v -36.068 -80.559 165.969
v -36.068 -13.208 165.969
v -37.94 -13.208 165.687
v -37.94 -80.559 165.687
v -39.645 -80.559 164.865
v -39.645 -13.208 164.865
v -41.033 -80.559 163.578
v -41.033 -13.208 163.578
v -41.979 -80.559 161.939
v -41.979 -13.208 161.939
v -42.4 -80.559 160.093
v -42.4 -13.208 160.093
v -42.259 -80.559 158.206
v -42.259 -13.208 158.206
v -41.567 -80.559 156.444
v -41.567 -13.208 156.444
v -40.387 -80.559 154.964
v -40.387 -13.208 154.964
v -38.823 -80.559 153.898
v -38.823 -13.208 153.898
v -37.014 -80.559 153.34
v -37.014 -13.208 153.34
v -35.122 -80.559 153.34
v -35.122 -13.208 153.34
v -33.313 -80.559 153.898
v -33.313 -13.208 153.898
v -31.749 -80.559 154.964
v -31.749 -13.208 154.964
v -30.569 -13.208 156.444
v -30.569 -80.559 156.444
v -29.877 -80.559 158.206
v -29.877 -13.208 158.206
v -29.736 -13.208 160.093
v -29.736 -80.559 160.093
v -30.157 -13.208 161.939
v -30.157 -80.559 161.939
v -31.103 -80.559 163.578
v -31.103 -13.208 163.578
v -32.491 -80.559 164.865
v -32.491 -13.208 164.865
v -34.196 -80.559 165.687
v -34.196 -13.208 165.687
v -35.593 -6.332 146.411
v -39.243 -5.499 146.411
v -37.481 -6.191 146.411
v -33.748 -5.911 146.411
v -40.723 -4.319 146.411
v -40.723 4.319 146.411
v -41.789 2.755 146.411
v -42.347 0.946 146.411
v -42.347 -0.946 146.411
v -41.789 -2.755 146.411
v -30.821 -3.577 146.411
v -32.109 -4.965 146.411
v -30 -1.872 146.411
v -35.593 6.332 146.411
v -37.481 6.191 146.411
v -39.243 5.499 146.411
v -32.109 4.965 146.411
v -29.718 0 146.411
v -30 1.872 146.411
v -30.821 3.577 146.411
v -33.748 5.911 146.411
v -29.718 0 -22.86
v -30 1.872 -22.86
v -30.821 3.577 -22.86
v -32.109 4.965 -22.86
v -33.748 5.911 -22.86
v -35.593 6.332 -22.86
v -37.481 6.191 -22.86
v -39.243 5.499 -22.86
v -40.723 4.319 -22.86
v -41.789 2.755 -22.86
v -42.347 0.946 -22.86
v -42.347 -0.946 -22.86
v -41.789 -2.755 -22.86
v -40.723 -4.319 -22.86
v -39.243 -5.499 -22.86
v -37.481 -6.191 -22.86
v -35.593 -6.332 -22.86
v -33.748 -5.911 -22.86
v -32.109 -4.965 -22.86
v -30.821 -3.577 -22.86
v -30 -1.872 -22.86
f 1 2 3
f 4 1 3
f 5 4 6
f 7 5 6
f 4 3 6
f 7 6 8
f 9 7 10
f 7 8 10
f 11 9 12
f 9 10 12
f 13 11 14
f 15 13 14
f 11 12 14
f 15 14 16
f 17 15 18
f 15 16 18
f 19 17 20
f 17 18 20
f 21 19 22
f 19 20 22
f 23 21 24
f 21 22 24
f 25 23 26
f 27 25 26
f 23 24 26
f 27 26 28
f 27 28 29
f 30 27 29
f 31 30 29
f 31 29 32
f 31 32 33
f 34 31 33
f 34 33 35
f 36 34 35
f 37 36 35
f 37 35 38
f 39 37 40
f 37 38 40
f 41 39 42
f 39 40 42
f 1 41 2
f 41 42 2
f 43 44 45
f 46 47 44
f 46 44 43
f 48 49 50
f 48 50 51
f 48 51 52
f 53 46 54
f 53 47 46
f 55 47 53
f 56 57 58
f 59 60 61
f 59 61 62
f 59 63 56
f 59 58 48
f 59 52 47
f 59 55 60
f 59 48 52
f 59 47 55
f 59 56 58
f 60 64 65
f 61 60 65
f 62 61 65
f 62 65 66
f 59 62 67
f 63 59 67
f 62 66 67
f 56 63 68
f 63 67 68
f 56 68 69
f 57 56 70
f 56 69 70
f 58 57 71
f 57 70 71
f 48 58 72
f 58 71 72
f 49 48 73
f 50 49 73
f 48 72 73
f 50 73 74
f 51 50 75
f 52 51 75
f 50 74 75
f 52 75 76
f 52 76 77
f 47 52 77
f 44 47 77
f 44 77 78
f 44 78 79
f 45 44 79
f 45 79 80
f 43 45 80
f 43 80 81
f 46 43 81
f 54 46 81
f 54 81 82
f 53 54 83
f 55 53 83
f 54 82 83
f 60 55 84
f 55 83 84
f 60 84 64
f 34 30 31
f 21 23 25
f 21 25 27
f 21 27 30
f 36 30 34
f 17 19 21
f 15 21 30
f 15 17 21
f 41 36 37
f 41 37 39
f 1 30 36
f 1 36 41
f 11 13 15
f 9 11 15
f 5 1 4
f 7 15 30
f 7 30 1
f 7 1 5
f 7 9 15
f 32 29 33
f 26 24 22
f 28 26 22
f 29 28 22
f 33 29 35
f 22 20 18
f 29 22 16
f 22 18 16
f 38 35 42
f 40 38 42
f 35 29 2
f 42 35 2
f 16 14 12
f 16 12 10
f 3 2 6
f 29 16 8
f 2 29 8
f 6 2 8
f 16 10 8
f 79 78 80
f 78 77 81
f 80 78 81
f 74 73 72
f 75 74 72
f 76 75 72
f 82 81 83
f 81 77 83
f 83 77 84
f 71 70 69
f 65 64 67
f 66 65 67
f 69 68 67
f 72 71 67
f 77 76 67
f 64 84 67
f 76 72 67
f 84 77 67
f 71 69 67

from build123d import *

# Parameters (mm, degrees)
BOSS_EXTRUDE1_START     = -169.27068
BOSS_EXTRUDE1_OUTLINE_R = 6.35
BOSS_EXTRUDE1_DEPTH     = 169.27068
SKETCH3_R               = 6.35
BOSS_EXTRUDE2_DEPTH     = 67.351244111


# Read off the part's stored shape, not the designer's step: Boss-Extrude1
with BuildPart() as part:
    # Boss-Extrude1 outline → Boss-Extrude1 (new body)
    with BuildSketch(Plane.XY.offset(146.41068).offset(BOSS_EXTRUDE1_START)):
        with Locations((-36.068, 0)):
            Circle(BOSS_EXTRUDE1_OUTLINE_R)
    extrude(amount=BOSS_EXTRUDE1_DEPTH)


with BuildPart() as body_2:
    # Sketch3 → Boss-Extrude2 (new body)
    with BuildSketch(Plane(origin=(0, -13.208, 0), x_dir=(-1, 0, 0), z_dir=(0, -1, 0))):
        with Locations(Location((36.068, -159.61868, 0), (0, 0, 270))):
            Circle(SKETCH3_R)
    extrude(amount=BOSS_EXTRUDE2_DEPTH)


solid = Compound([part.part, body_2.part])
